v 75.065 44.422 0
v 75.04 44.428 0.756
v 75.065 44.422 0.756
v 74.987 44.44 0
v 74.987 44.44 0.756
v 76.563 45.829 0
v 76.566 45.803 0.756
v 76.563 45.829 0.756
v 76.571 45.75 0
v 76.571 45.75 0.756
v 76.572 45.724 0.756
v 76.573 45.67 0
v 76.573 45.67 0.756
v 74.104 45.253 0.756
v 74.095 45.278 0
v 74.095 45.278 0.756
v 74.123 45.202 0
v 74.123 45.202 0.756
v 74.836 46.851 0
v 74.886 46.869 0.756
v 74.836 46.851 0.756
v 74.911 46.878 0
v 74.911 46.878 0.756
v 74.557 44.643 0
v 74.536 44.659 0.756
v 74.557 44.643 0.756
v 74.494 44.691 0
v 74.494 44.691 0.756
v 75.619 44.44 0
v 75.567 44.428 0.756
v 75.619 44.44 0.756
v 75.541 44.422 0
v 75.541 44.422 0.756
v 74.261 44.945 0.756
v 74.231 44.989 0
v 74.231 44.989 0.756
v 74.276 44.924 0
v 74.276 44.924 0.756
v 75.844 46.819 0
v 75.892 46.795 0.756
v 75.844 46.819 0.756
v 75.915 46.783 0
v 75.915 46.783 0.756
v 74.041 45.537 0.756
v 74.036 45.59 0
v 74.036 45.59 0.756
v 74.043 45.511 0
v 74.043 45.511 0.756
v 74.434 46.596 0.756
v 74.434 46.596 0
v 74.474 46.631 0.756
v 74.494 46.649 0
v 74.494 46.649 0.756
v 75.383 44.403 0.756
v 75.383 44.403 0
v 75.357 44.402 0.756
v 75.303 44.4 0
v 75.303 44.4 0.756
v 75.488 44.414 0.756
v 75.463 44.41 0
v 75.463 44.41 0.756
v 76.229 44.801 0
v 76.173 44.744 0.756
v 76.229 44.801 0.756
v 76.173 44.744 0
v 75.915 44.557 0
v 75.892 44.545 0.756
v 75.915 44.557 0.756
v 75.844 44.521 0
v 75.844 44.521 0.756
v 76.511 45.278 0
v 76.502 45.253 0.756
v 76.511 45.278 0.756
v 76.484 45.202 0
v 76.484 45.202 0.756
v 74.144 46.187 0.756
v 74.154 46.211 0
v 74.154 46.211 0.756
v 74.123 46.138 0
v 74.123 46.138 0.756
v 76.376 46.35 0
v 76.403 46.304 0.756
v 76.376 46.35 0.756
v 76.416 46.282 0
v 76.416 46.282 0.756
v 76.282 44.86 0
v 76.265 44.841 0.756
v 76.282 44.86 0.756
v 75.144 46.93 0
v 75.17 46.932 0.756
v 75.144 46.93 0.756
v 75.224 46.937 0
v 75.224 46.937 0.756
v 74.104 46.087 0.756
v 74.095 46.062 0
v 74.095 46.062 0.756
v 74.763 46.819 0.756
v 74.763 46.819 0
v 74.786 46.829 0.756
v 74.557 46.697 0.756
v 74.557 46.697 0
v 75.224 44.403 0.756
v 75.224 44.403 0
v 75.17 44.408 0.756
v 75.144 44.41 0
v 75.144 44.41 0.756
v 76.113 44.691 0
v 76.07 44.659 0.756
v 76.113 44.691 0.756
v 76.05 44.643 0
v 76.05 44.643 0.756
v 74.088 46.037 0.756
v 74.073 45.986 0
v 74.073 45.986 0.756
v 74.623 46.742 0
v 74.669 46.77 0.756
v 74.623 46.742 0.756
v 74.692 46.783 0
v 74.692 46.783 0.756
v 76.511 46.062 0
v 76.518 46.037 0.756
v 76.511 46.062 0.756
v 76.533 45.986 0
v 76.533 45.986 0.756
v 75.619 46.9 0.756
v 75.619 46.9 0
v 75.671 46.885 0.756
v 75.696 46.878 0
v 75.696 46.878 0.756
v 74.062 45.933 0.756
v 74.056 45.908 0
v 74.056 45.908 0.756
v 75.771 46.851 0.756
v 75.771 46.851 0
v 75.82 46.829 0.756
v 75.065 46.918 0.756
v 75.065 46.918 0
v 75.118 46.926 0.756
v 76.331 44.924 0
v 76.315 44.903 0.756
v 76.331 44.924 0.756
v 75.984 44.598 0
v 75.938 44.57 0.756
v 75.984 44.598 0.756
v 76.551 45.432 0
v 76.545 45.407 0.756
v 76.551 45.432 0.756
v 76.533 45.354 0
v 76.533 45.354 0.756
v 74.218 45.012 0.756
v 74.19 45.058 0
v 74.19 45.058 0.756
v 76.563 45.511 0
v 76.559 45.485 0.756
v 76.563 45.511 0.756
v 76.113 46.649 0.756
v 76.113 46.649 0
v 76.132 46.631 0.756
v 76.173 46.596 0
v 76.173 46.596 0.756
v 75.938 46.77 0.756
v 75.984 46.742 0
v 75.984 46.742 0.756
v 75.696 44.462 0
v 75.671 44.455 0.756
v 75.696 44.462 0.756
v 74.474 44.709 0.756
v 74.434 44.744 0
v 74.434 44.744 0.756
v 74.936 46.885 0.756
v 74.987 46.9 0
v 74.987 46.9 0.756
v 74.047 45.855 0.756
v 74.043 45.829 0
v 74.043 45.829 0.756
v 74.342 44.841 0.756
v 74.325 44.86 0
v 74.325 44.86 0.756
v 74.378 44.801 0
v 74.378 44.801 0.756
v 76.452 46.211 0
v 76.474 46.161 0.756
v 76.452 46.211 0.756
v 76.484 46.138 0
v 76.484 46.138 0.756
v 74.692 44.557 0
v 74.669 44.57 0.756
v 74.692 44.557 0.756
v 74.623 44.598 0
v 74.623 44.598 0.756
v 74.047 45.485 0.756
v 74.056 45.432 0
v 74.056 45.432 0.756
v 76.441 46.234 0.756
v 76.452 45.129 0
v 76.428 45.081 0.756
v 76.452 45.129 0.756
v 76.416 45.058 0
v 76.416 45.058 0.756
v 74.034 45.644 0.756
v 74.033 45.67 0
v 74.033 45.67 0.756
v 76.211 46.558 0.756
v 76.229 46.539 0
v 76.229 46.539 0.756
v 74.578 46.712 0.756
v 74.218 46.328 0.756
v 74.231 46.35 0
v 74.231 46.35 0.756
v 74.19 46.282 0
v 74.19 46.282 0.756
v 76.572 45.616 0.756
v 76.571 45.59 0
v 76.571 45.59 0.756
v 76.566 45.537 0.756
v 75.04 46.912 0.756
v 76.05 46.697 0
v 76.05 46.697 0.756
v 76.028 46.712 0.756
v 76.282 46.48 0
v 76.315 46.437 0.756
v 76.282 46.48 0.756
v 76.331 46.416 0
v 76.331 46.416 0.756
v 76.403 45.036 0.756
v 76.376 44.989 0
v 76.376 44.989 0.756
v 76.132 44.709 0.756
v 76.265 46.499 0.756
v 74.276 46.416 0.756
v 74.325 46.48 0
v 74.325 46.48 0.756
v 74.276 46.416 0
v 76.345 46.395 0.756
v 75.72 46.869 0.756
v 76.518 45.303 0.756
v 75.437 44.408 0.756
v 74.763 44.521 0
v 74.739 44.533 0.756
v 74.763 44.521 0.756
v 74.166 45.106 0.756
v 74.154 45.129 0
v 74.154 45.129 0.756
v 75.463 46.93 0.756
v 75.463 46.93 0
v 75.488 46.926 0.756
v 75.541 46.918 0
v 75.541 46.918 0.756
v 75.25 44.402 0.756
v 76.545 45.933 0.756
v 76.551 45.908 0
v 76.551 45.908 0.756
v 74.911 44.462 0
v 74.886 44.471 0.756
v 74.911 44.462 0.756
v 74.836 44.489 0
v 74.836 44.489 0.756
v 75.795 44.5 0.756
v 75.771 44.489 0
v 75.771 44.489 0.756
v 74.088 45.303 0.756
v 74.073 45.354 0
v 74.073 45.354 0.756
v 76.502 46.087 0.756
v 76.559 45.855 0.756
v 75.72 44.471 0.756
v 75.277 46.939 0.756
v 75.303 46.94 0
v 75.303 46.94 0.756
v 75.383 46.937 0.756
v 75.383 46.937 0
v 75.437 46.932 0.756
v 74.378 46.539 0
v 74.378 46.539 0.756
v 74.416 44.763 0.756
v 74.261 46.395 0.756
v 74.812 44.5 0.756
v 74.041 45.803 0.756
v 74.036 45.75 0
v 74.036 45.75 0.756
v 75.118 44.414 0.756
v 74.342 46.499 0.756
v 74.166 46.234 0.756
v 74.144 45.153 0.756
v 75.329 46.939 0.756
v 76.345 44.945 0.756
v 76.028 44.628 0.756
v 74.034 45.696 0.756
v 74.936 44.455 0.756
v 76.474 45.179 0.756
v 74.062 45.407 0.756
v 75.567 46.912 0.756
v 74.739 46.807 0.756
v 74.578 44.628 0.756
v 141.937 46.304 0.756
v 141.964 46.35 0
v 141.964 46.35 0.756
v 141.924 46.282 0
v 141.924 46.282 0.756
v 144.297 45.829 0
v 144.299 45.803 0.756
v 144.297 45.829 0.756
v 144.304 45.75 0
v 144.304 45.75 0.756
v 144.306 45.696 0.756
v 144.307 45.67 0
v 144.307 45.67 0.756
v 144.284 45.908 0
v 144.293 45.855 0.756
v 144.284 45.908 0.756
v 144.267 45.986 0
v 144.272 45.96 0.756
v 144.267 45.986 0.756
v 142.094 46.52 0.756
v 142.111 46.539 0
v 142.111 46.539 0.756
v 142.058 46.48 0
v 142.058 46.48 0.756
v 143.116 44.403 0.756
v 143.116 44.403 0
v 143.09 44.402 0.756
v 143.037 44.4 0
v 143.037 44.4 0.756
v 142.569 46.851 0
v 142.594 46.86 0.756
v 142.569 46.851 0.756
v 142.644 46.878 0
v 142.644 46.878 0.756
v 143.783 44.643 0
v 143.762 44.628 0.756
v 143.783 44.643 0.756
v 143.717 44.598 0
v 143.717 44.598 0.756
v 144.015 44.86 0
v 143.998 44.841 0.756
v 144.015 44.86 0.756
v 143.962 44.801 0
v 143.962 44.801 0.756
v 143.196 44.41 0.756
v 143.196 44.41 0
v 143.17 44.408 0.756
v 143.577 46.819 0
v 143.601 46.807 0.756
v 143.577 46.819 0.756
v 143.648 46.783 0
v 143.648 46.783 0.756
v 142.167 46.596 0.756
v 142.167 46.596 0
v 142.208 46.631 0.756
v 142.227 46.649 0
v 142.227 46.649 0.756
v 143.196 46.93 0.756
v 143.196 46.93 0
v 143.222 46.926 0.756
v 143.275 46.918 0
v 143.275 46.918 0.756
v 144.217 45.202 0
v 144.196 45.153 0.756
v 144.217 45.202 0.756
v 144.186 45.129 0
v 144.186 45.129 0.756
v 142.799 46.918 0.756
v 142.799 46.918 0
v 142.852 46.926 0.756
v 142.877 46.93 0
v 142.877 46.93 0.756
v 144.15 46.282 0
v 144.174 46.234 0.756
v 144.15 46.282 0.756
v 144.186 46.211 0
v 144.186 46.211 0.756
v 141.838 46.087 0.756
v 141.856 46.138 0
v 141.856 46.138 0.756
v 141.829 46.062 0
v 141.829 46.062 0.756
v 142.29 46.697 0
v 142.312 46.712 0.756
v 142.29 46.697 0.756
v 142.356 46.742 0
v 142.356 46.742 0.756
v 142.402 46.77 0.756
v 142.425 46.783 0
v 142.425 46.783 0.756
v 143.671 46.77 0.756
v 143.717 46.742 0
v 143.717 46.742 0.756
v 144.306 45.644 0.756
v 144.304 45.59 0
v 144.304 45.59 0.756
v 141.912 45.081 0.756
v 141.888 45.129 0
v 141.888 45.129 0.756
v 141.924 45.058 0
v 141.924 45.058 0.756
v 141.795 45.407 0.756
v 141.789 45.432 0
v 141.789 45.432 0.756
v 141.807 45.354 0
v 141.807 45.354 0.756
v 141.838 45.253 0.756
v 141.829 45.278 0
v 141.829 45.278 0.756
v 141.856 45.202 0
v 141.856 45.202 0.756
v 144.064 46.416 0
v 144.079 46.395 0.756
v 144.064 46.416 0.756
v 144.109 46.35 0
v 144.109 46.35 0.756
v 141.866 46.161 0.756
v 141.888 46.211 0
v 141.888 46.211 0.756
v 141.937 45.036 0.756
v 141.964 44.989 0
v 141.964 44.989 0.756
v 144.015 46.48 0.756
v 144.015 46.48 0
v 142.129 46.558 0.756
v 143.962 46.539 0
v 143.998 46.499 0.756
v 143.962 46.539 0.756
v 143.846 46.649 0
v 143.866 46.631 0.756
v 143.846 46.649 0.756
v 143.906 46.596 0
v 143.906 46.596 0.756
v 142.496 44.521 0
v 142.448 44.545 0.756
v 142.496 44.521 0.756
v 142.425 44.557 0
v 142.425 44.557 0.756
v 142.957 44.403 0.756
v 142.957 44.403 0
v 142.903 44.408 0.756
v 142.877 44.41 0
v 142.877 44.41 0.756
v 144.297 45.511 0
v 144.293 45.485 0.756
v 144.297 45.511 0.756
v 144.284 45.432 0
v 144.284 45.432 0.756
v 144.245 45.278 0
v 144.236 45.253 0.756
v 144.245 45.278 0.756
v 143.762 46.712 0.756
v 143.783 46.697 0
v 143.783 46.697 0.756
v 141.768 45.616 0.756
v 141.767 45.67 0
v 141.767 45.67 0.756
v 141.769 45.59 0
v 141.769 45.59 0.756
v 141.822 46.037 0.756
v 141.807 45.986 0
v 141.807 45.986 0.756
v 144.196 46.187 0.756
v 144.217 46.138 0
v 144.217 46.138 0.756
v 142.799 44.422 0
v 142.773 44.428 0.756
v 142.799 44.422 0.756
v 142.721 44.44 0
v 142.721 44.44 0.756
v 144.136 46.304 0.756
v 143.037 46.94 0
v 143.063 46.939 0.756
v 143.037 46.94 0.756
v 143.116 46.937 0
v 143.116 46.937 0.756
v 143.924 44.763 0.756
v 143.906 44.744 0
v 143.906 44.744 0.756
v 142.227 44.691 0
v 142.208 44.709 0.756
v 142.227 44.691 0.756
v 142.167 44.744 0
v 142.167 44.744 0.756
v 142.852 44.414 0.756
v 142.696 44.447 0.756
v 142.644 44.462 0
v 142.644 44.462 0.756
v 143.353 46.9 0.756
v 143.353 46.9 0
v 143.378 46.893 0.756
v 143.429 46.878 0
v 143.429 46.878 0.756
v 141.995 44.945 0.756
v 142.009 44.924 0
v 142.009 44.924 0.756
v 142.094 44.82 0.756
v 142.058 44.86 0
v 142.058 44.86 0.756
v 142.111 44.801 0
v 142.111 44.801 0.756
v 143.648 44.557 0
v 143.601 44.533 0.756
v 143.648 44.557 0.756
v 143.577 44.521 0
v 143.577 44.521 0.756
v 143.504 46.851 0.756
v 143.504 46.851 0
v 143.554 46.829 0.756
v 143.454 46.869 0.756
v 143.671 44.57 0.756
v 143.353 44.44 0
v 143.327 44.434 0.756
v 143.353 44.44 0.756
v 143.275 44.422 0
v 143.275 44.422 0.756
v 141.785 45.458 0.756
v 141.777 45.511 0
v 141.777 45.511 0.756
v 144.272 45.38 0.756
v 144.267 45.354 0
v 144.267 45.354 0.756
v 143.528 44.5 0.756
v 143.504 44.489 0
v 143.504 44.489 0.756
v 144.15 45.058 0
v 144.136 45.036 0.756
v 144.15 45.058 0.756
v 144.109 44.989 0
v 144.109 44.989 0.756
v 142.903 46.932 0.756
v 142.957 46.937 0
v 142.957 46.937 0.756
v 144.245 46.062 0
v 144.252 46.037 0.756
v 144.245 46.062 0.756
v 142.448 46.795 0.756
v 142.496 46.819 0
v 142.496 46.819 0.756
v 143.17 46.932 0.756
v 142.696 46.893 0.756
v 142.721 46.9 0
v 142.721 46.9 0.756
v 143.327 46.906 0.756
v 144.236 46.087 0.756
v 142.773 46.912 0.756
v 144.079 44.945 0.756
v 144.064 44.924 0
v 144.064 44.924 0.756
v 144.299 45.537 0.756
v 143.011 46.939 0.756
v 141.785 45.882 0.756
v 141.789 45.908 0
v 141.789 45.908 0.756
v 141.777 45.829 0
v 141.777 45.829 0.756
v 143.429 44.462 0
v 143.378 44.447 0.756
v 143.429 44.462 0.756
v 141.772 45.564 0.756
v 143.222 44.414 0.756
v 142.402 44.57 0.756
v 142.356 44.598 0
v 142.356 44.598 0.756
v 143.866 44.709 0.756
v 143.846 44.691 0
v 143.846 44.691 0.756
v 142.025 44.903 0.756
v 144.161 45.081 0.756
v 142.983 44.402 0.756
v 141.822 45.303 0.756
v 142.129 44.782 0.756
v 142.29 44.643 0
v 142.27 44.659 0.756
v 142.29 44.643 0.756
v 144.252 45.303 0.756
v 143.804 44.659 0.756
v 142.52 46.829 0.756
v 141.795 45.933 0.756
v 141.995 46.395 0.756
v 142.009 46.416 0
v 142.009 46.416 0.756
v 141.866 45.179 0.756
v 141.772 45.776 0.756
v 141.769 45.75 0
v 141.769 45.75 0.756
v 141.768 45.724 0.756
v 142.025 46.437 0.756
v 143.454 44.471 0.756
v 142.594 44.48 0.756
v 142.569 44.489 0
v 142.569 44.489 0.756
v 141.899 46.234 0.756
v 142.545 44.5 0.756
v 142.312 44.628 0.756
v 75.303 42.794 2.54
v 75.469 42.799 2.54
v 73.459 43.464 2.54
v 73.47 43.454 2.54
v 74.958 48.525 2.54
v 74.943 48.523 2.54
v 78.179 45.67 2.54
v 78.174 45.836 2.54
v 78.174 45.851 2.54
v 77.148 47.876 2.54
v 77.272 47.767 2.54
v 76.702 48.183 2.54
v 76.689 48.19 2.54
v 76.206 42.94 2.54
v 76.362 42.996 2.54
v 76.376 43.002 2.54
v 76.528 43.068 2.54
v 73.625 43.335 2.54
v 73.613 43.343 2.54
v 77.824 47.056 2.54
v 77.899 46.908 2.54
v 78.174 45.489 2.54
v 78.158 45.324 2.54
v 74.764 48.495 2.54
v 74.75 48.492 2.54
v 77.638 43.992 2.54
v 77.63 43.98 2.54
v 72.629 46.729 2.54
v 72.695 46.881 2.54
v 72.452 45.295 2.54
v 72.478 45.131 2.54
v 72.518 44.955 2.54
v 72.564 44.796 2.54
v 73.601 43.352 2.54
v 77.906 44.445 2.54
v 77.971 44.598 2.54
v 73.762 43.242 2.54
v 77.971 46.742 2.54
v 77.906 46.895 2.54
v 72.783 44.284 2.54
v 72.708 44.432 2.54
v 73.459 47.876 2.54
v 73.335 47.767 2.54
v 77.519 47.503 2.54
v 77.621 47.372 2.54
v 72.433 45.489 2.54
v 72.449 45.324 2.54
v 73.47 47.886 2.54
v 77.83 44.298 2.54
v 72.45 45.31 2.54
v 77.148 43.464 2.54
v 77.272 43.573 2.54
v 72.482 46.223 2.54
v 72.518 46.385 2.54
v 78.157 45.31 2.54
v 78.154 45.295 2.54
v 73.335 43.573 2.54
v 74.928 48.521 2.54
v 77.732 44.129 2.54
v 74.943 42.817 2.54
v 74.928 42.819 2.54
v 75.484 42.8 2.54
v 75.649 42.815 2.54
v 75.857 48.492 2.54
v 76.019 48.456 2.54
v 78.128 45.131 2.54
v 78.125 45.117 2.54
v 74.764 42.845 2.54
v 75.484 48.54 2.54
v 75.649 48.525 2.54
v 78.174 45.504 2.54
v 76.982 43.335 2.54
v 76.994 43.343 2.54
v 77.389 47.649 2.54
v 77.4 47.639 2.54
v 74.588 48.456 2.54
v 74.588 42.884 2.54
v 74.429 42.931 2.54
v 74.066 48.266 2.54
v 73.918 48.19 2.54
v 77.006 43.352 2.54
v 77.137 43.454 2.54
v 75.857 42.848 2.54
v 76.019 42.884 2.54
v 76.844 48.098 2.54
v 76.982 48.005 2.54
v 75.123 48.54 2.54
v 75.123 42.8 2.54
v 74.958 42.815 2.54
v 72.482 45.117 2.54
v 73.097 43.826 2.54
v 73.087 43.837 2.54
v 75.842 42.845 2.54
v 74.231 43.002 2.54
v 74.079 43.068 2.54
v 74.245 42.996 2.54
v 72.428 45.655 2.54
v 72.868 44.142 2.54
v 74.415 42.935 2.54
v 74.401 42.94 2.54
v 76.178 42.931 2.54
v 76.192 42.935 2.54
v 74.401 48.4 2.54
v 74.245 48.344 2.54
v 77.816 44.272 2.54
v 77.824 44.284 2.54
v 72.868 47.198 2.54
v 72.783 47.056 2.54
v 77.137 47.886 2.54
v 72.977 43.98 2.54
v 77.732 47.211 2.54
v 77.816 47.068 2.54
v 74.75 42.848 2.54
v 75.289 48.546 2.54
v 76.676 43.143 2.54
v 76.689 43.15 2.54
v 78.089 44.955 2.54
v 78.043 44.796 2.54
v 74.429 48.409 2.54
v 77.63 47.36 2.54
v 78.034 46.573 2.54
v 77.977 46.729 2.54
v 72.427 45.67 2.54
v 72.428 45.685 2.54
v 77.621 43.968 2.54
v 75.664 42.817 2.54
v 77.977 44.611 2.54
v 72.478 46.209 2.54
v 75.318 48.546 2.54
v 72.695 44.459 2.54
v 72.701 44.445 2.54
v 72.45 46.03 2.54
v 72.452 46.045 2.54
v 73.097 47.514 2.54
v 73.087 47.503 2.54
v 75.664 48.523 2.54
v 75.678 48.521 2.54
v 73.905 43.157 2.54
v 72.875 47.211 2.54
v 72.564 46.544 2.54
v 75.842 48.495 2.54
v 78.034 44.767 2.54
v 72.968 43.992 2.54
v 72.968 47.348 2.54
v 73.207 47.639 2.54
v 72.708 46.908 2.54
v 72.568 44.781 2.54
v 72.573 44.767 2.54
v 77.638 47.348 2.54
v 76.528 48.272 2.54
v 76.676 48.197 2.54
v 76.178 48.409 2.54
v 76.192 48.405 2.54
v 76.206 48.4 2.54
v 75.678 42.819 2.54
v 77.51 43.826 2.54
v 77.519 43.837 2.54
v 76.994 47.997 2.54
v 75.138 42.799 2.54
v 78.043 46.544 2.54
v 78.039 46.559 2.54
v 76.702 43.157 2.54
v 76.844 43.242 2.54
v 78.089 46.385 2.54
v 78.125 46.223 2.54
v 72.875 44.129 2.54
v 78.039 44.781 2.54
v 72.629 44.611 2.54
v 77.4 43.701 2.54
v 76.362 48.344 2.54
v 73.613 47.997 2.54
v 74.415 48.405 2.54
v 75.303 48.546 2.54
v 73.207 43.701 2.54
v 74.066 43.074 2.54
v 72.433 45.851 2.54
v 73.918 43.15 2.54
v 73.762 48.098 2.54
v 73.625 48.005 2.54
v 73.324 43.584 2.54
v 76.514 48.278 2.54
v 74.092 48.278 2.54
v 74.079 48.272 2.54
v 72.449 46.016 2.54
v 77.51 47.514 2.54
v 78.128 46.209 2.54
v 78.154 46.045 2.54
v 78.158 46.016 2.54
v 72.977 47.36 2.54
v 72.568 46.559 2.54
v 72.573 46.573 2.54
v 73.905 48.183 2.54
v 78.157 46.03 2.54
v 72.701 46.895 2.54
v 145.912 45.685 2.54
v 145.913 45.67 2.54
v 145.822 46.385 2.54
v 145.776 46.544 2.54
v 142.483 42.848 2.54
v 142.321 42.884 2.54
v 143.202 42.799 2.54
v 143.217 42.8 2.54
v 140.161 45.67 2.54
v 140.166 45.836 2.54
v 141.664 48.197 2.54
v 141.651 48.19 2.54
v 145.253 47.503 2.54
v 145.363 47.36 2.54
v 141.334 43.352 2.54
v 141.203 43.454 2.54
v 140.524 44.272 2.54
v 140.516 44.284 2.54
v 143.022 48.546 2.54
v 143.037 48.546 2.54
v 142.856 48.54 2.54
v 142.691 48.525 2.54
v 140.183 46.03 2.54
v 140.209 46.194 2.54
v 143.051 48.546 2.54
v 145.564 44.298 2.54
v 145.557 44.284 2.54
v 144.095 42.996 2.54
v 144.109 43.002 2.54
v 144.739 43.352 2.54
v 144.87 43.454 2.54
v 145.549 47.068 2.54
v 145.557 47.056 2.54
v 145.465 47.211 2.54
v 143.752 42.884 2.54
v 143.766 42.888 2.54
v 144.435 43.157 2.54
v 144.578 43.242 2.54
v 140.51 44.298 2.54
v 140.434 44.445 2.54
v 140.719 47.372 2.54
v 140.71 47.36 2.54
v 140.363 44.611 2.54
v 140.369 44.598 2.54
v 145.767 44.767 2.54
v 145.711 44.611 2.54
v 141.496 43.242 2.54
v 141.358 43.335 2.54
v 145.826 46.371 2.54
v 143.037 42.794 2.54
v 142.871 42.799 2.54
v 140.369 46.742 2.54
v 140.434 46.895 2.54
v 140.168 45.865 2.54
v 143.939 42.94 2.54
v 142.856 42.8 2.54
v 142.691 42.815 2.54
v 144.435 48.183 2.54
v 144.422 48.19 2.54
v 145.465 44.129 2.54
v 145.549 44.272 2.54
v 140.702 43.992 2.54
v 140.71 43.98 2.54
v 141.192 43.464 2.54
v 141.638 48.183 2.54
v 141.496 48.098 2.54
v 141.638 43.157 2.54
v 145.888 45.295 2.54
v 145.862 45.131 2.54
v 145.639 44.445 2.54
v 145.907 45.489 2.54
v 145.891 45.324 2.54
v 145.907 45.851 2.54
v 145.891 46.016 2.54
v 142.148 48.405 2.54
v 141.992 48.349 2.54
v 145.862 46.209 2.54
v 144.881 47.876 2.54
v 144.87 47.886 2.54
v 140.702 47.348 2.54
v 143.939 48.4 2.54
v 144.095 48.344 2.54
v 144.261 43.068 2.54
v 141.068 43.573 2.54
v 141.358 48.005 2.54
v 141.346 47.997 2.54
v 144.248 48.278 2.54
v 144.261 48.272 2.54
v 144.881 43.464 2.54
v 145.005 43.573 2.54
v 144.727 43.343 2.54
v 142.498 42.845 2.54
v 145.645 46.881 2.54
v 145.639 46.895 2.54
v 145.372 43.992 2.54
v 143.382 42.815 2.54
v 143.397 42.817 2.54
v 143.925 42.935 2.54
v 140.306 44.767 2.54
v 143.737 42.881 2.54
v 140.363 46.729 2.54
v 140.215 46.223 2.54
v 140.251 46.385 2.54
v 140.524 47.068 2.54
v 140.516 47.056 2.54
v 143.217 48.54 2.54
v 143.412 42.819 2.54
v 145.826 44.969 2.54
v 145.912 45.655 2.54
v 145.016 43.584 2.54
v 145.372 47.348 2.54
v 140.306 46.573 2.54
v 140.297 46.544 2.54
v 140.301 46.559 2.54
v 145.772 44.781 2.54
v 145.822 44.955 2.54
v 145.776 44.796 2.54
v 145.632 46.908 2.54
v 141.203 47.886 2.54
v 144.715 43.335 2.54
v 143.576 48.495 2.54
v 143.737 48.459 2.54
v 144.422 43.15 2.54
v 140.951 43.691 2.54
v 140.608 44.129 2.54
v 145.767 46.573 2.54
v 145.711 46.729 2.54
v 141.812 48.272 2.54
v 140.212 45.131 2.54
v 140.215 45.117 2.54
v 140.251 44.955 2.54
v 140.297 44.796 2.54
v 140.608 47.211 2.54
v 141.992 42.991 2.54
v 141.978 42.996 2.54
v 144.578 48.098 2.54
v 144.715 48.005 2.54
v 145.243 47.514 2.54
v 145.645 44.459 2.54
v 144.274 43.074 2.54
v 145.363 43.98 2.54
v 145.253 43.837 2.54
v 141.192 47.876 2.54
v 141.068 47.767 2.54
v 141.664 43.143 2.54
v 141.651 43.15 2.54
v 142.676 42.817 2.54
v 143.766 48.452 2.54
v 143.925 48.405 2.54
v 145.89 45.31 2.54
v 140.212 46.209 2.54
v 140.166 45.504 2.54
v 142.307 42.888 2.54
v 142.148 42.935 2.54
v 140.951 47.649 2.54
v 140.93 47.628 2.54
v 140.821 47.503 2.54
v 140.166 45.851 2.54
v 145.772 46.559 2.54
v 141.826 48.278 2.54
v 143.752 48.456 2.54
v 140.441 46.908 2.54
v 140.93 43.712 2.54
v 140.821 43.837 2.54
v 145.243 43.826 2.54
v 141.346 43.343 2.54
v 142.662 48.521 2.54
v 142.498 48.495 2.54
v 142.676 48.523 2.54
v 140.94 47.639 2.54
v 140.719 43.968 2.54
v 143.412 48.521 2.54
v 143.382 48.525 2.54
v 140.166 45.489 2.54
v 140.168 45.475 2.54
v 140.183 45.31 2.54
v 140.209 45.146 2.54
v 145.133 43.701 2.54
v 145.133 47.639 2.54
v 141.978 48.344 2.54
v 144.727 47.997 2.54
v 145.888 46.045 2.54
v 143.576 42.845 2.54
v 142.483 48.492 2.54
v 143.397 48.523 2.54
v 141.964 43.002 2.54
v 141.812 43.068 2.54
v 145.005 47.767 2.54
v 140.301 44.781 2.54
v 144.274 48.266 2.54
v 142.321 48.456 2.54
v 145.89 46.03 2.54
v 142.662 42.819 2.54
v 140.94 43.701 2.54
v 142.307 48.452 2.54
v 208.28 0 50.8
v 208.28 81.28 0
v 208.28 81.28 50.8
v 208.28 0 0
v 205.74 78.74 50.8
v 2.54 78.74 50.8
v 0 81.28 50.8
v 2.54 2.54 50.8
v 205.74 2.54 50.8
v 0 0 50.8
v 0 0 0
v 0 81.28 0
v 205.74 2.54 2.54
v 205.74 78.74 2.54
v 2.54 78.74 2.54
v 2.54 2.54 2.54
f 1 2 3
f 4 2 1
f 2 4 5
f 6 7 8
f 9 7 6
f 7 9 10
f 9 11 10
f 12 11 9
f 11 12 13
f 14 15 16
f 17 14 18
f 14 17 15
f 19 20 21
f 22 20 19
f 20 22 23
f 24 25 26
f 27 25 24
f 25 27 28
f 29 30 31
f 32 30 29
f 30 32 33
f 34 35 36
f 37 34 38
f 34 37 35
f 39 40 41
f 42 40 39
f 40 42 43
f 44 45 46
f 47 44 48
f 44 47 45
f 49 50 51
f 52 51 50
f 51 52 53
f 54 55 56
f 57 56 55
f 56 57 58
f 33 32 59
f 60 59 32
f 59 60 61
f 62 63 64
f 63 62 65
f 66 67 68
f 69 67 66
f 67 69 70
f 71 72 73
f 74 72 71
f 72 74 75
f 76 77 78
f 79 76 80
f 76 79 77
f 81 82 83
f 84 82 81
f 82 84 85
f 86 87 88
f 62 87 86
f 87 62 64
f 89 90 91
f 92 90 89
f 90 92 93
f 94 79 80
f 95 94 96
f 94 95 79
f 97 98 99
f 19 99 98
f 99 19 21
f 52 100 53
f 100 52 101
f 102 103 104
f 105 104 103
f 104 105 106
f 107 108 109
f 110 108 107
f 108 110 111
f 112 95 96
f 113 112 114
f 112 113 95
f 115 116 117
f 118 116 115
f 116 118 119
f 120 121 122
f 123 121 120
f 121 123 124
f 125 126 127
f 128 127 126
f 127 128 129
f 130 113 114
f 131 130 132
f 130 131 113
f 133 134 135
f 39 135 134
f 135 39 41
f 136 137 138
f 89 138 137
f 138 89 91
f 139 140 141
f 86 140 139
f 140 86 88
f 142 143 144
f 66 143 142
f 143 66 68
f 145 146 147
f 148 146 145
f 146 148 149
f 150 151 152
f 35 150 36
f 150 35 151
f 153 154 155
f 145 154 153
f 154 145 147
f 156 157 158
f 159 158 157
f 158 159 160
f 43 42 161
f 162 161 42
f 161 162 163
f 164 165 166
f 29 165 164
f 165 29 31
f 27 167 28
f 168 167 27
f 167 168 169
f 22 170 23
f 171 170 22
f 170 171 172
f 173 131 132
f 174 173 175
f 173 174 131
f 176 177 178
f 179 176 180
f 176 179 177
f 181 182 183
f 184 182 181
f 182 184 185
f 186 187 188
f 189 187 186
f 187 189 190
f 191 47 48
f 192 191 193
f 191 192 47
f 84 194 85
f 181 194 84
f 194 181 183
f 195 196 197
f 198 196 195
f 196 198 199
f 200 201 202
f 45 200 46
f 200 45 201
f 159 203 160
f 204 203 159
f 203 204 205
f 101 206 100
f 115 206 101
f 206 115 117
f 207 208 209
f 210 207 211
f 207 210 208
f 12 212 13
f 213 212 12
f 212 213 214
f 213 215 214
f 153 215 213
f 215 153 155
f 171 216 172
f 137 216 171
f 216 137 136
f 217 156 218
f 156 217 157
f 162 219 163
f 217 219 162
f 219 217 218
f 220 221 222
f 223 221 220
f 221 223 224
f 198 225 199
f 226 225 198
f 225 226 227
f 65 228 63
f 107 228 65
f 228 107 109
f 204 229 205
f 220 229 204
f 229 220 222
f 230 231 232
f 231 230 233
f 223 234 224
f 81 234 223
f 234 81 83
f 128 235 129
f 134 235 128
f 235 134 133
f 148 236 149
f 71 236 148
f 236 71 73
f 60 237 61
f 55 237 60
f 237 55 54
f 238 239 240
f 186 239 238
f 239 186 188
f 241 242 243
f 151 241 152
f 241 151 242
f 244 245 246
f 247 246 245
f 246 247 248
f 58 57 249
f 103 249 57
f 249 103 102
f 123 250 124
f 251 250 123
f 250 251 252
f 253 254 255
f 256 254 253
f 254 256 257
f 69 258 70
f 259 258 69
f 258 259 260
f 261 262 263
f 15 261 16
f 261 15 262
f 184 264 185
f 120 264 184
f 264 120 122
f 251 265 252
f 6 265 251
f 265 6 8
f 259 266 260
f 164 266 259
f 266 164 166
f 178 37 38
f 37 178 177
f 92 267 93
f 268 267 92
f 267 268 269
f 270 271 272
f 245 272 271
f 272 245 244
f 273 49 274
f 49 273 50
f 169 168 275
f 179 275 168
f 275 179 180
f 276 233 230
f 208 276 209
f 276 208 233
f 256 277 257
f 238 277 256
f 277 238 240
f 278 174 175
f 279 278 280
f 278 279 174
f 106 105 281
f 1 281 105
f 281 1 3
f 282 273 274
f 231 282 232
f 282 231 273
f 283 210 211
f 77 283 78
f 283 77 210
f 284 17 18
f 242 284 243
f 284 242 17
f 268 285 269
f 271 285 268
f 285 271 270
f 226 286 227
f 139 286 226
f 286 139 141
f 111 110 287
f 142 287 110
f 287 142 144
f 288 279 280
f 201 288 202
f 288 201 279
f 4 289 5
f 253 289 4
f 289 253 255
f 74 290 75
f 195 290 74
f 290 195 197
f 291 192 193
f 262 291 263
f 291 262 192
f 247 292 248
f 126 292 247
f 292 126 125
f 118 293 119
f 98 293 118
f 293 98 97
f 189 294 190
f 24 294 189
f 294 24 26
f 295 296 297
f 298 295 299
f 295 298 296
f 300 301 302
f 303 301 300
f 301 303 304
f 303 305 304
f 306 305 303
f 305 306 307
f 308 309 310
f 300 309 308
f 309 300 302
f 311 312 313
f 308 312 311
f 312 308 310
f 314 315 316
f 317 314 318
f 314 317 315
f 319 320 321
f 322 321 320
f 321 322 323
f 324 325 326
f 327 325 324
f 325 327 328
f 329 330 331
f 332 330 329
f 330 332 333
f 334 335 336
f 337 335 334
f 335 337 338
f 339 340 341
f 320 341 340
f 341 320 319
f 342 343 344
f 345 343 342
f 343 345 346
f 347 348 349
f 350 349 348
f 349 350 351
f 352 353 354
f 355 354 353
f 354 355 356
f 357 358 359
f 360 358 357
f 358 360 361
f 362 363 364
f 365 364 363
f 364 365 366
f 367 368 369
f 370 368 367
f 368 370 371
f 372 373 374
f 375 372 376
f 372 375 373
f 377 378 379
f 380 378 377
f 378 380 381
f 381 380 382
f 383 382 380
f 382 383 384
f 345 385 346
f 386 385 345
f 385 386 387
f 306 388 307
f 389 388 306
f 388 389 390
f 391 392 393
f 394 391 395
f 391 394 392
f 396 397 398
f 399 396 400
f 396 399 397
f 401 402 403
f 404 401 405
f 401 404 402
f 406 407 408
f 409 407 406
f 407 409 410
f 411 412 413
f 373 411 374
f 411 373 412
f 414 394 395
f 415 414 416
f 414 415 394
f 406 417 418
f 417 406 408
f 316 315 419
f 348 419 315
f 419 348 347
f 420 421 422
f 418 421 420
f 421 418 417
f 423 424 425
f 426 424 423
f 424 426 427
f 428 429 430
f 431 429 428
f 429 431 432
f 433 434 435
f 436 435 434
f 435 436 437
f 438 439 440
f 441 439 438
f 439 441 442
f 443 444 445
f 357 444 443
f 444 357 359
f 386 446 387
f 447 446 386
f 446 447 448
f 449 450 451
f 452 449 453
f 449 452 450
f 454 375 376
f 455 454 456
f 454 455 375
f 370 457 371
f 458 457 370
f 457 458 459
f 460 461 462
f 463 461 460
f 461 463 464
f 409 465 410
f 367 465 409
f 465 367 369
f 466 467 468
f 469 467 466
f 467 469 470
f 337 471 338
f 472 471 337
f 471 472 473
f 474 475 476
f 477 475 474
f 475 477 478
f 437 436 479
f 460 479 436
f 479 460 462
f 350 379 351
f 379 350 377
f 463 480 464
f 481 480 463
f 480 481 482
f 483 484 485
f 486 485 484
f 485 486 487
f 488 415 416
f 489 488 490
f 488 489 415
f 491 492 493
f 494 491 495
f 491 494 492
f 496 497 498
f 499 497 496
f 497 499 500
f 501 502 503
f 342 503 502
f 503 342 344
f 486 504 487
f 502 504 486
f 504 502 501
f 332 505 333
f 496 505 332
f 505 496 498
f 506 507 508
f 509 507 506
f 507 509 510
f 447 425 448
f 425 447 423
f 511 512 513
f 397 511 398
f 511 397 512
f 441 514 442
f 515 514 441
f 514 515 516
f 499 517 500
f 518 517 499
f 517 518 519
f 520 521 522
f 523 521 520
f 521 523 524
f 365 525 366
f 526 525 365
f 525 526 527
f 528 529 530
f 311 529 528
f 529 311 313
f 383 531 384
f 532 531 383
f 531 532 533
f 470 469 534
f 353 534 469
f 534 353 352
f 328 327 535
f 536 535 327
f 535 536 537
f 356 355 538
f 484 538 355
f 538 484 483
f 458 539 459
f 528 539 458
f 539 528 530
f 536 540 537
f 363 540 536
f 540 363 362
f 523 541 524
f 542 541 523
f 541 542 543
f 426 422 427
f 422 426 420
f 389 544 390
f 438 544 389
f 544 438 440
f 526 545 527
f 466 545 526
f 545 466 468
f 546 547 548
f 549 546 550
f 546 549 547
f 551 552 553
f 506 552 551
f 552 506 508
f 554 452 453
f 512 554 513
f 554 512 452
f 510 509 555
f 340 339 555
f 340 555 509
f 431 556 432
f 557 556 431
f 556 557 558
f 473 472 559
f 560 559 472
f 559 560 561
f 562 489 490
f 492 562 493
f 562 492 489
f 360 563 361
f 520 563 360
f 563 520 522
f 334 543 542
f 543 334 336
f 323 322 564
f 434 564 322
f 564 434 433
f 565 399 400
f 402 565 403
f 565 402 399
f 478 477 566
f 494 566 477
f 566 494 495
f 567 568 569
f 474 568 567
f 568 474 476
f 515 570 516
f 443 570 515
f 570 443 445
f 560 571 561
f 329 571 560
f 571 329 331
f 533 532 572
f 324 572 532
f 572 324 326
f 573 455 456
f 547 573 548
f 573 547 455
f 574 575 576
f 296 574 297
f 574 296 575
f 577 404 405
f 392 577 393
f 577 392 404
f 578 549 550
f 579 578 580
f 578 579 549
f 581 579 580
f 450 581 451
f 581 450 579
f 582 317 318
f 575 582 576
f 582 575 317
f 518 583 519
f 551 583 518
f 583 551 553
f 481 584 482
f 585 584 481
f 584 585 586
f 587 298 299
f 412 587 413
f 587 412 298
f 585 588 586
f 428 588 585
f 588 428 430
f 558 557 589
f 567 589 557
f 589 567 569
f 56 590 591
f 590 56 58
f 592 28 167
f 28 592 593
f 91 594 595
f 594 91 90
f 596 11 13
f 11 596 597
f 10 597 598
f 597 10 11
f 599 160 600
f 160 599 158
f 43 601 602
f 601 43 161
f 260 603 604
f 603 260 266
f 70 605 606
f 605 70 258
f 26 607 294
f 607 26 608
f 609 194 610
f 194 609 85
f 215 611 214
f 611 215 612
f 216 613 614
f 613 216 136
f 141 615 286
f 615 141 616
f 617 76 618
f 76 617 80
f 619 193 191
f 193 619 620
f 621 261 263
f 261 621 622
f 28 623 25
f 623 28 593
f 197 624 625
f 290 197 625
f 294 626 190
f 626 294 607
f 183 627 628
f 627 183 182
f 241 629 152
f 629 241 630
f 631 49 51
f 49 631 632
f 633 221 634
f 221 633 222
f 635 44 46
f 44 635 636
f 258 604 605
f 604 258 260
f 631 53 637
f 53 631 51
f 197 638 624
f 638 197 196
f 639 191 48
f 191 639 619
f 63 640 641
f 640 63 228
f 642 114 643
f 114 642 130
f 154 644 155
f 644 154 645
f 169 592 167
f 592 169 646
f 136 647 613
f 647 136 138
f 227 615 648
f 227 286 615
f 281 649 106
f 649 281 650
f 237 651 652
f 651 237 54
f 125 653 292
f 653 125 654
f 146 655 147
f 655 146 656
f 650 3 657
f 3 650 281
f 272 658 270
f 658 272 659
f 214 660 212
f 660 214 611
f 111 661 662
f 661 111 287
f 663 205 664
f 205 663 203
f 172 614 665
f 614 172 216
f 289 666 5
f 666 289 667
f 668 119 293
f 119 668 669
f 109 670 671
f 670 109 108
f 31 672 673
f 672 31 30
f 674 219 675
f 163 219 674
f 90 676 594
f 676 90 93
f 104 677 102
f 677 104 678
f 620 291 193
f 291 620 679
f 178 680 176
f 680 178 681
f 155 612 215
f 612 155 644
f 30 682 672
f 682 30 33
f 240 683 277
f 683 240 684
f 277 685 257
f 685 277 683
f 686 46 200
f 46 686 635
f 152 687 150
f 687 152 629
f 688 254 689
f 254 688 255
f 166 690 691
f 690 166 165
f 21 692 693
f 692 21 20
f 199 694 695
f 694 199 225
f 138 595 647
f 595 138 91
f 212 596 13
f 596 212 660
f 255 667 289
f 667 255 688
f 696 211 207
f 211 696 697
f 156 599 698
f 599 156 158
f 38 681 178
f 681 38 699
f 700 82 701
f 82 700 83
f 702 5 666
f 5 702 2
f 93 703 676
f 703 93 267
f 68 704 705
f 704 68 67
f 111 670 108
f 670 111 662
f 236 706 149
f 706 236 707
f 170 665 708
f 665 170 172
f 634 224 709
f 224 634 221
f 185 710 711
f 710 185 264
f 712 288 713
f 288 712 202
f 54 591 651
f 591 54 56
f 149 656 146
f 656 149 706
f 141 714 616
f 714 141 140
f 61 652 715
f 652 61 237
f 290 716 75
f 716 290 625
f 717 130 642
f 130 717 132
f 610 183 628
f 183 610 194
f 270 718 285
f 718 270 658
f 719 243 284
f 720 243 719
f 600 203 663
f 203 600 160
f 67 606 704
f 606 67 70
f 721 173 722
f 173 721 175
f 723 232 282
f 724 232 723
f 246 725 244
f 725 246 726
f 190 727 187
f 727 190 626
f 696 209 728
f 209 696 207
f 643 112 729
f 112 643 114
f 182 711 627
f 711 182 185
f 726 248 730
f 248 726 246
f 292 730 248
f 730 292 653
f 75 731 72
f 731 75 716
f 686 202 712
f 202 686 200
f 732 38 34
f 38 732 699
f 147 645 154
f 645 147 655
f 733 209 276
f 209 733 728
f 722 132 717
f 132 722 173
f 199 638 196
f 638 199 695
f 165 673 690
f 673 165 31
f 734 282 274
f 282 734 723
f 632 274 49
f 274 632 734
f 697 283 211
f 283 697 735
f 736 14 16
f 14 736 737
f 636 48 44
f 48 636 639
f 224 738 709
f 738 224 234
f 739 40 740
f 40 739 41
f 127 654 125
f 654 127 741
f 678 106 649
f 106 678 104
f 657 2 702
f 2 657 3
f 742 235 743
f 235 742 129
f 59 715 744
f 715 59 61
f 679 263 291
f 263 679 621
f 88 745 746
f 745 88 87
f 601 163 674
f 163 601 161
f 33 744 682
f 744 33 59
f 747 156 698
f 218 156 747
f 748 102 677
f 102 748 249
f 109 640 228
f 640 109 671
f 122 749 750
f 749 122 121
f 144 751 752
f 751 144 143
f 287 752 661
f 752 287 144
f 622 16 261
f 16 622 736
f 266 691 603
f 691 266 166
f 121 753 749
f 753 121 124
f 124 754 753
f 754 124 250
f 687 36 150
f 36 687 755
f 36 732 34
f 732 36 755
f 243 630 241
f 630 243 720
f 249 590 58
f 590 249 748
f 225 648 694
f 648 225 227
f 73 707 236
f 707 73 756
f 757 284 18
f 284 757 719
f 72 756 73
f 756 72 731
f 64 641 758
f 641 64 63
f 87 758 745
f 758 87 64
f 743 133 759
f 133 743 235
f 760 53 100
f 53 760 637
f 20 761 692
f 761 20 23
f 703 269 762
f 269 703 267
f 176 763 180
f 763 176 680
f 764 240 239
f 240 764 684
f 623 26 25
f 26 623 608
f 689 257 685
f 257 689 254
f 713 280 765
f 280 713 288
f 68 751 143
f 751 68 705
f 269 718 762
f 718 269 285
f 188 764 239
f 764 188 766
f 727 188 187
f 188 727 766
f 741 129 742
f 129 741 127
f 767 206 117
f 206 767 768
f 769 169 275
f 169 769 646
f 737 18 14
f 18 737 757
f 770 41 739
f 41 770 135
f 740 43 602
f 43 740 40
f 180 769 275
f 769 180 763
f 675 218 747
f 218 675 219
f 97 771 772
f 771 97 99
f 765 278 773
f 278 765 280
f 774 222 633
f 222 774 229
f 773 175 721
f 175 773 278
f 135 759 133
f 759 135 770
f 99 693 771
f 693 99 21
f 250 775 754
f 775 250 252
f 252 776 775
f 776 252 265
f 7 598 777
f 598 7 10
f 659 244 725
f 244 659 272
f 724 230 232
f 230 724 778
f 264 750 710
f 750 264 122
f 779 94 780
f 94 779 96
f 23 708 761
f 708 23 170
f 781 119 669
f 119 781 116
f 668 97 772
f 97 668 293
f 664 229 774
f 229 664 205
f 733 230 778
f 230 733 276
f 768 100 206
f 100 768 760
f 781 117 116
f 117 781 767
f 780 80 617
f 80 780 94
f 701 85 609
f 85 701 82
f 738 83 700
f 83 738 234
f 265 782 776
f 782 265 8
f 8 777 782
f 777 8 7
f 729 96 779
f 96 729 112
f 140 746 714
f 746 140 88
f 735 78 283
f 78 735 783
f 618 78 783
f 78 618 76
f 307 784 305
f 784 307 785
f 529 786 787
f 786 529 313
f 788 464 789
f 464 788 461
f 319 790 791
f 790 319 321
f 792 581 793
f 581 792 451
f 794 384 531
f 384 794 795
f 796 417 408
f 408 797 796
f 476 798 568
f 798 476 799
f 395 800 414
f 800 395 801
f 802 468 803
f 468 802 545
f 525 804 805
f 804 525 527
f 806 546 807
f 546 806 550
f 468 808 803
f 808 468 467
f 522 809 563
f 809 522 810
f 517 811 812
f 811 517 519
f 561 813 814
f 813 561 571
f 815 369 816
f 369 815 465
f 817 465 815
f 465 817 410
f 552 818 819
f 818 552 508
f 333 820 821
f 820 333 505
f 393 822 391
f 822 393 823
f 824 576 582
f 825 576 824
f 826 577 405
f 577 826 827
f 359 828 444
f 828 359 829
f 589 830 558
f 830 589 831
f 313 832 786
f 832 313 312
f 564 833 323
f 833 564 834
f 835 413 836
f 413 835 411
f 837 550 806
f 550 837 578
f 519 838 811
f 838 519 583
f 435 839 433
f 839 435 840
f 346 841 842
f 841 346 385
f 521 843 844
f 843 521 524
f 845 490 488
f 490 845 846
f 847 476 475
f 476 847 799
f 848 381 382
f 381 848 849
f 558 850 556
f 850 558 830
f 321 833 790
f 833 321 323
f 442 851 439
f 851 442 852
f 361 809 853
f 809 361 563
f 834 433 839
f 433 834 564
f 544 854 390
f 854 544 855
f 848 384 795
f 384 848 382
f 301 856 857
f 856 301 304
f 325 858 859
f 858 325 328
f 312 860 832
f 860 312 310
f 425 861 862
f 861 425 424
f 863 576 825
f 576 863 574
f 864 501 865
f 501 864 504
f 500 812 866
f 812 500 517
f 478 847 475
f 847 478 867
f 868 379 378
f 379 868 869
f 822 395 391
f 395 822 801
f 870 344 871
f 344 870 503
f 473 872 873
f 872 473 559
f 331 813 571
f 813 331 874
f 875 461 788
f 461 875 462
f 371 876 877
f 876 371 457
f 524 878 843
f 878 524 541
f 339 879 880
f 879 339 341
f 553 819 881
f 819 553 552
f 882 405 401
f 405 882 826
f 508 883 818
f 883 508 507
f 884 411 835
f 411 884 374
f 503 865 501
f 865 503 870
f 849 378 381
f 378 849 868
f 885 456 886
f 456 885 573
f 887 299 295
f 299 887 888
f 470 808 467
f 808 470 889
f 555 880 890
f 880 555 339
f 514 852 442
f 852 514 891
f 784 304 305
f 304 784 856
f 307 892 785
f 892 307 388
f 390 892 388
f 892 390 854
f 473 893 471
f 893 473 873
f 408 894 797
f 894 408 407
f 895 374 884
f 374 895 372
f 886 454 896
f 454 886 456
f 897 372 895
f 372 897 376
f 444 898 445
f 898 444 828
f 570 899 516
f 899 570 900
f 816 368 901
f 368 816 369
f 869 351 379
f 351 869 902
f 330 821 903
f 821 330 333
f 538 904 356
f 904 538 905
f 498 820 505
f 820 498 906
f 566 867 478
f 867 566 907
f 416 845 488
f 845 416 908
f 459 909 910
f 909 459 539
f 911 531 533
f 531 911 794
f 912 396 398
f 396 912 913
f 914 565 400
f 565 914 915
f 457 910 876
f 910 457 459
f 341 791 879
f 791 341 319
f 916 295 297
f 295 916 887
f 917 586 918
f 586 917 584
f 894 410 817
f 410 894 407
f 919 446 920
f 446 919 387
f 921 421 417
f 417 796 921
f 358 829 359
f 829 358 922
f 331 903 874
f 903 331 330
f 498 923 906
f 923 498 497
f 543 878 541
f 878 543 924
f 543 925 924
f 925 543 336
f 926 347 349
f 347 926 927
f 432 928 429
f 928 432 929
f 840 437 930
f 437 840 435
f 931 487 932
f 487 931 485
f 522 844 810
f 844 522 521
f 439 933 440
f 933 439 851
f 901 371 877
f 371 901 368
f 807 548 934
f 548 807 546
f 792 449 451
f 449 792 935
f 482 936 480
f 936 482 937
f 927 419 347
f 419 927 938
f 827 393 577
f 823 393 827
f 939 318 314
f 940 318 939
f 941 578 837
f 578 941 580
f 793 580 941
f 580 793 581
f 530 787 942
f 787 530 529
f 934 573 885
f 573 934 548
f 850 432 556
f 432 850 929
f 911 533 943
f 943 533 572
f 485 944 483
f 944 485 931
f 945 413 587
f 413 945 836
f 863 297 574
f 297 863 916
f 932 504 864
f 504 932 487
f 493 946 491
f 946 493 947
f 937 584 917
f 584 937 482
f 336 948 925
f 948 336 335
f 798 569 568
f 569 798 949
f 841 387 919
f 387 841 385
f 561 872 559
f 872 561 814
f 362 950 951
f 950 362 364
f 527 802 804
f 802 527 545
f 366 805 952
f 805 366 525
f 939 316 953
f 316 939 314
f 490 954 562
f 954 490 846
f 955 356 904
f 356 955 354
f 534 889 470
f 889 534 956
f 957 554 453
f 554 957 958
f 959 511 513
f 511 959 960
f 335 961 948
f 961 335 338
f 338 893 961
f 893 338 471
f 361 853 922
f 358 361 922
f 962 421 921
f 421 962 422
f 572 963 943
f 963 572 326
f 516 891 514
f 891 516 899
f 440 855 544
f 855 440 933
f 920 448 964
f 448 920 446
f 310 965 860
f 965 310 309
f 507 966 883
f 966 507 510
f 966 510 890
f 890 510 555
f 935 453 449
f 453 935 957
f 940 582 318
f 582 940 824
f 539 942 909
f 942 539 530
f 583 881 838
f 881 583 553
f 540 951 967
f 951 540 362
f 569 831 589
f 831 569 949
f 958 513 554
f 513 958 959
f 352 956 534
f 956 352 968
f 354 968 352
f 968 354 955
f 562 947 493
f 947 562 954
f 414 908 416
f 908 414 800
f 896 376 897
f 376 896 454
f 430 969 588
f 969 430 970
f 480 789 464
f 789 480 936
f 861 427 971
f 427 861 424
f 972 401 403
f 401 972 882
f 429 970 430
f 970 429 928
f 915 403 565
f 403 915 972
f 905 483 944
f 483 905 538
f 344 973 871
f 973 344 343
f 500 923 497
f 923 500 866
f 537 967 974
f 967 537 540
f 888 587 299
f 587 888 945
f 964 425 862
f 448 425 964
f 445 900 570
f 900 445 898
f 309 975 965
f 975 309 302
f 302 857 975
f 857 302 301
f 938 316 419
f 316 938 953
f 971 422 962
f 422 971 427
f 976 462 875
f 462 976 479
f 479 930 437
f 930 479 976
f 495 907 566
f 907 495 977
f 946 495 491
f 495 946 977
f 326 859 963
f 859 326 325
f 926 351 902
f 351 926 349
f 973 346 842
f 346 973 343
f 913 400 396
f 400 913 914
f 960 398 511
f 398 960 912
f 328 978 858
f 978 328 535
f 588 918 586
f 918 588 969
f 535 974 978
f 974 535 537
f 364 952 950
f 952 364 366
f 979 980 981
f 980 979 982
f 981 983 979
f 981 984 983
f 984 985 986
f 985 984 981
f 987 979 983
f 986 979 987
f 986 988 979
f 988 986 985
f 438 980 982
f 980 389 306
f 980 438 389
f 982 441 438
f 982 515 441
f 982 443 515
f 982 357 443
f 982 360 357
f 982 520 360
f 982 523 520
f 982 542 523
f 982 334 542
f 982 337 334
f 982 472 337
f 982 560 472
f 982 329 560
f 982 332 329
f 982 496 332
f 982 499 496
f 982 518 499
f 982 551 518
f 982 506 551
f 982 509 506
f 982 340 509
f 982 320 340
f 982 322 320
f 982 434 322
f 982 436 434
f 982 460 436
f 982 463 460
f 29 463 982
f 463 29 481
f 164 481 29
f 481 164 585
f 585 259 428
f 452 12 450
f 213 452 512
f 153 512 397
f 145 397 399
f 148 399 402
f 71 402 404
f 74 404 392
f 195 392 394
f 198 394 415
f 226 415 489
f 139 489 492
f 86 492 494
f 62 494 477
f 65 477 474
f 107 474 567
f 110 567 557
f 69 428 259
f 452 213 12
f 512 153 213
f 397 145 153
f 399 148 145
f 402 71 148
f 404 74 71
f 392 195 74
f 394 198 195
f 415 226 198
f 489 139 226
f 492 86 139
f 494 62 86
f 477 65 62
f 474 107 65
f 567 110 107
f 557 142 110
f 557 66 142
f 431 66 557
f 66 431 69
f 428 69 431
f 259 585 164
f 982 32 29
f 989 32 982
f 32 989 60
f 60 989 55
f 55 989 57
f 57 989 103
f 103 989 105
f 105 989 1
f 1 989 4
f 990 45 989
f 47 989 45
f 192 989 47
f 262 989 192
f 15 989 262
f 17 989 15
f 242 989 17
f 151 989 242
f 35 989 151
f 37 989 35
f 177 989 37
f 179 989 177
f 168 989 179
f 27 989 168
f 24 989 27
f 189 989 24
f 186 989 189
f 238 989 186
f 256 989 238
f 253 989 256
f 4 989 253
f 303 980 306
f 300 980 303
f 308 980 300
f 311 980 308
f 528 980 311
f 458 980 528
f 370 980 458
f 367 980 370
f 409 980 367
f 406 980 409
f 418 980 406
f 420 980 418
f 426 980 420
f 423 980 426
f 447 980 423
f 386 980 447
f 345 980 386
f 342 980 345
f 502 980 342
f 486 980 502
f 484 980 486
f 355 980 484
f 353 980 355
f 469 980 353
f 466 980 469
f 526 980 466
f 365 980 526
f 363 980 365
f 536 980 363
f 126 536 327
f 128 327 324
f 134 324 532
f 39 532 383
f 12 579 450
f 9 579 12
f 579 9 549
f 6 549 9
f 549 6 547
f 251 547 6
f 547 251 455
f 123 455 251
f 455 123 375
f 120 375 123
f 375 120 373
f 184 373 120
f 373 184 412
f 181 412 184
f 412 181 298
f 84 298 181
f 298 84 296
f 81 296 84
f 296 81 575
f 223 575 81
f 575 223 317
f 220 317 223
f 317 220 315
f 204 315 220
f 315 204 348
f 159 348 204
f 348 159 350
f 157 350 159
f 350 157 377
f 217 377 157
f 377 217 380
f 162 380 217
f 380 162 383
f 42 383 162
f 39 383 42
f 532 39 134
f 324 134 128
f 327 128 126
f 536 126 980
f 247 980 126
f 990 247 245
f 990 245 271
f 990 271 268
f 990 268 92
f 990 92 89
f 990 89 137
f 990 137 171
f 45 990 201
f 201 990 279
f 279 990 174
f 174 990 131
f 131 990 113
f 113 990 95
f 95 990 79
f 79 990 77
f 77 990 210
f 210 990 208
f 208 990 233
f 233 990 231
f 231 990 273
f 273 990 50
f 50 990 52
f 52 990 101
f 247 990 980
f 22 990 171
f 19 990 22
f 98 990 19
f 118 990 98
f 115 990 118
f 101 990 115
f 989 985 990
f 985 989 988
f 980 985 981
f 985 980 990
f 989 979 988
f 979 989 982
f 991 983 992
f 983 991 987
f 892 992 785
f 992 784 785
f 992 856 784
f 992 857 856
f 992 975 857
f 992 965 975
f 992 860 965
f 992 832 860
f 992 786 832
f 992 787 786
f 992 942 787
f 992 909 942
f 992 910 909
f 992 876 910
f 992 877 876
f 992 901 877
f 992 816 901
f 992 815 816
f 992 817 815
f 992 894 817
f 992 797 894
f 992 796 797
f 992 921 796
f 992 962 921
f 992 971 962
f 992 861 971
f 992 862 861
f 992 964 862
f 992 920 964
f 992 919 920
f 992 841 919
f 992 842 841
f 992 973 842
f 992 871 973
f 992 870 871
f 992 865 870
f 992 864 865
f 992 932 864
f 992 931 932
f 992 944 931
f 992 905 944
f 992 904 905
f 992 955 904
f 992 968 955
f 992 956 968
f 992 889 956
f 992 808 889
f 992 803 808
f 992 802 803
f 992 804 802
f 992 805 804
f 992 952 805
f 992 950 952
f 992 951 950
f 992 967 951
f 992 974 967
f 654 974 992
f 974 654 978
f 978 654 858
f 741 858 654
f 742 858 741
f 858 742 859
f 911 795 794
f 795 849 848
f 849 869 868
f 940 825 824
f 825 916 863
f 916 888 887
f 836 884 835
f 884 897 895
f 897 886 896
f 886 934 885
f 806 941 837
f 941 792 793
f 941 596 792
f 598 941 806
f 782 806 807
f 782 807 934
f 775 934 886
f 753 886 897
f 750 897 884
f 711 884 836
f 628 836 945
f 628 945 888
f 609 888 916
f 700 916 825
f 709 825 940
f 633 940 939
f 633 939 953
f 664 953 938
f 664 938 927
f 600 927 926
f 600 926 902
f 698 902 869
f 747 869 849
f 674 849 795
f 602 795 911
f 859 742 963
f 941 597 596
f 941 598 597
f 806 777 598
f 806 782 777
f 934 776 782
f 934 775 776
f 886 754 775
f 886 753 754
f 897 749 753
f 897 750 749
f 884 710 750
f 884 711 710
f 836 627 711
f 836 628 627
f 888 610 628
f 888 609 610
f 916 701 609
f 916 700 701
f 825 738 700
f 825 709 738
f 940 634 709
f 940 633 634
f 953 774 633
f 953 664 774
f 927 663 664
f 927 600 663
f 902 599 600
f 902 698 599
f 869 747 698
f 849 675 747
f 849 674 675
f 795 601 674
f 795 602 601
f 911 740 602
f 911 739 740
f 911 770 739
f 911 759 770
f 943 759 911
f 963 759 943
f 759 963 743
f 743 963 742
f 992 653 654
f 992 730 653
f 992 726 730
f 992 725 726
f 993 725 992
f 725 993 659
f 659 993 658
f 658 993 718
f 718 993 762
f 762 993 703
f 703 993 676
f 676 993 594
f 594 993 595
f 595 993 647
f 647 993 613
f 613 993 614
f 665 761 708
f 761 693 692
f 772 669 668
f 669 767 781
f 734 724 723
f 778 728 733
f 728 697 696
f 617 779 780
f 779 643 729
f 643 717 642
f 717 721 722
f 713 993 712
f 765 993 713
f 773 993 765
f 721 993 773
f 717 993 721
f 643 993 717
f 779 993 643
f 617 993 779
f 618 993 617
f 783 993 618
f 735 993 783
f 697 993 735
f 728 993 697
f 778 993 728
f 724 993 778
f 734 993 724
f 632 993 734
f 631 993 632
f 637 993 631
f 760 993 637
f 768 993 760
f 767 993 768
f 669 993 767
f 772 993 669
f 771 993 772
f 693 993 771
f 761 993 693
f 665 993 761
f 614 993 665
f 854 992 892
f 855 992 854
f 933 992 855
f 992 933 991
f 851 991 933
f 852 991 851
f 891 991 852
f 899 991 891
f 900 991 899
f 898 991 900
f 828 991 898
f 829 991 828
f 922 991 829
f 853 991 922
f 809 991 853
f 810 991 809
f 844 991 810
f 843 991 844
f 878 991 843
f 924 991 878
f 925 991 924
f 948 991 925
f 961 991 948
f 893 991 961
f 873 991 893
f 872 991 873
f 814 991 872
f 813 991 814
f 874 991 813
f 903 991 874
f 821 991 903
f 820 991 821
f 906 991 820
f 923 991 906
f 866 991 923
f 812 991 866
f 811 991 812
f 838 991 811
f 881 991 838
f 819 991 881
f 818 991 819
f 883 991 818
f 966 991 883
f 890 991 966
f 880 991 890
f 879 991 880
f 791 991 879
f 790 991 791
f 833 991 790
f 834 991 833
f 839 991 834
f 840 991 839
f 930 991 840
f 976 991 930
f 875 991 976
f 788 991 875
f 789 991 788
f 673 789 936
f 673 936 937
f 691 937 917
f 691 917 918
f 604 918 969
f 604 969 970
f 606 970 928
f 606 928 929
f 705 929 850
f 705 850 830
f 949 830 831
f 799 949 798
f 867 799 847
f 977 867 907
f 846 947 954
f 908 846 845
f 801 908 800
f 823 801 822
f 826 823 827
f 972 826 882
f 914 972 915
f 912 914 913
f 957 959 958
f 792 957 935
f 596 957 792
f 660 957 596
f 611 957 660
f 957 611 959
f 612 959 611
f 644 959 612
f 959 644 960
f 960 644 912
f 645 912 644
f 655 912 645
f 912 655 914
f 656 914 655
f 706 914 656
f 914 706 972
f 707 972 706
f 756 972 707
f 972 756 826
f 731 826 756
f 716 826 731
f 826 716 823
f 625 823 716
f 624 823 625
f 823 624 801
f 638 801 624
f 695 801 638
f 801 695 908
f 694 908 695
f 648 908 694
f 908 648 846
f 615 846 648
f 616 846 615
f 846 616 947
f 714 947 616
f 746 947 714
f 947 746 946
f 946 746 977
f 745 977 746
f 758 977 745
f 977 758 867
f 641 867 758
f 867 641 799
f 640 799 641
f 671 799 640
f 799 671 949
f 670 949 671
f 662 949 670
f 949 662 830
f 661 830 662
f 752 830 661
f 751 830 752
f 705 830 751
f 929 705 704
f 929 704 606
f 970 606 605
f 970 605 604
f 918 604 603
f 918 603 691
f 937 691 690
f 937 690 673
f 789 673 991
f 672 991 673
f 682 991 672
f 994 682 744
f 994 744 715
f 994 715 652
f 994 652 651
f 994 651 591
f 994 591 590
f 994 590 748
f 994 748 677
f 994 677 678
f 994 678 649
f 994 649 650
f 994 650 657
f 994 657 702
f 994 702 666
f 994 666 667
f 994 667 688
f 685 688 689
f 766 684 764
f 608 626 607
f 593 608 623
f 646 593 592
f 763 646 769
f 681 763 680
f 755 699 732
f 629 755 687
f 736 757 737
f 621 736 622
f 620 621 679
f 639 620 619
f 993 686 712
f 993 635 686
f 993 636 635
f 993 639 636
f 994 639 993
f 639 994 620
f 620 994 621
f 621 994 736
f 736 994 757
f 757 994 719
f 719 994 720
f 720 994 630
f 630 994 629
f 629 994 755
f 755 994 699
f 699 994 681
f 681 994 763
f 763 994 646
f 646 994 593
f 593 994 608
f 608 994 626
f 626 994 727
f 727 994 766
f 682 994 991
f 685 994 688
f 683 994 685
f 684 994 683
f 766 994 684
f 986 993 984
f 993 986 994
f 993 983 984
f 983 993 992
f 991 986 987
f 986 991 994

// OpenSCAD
// All units are in Milimeter
$fn = 100;

//Makeup bag container
bagLt = 203.2; // 8"
bagWt = 76.2; // 3"
bagHt = 50.8; // 2"
bagThickness = 2.54; // .10"
floorThickness = 6.3; //.25"
screwHole = 5.08; // .20"
chamferAdjust = 6.4;
screwHoleAmount = 3; // amount -1 

difference(){
  cube([
    bagLt+bagThickness*2,
    bagWt+bagThickness*2,
    bagHt
    ],
    center=false
  );
  // Inside Dimensions
  translate([bagThickness,bagThickness,bagThickness])
  cube([
    bagLt,
    bagWt,
    bagHt+50
    ],
    center=false
  );
  // Screw Hole
  for(x=[1:screwHoleAmount-1])
    screwHoleBox(x,bagWt,bagLt,bagWt,bagThickness,floorThickness);
  // Chamfer
  for(x=[1:screwHoleAmount-1])
    chamferBox(x,bagWt,bagLt,bagWt,bagThickness,floorThickness);
  

};

// Screw Hole
module screwHoleBox(
  xPos=0,
  yPos=0,
  boxL,
  boxW,
  holeDia=5.08,
  wallThickness=2.54,
  bottomThickness=6.3){
  translate([
    (wallThickness)+(holeDia/2)+xPos*(boxL/screwHoleAmount),
    (wallThickness)+(holeDia/2)+yPos/2,
    -bottomThickness])
  cylinder(
   150,
   d=holeDia,
   center=false
  );
}

module chamferBox(
  xPos=0,
  yPos=0,
  boxL,boxW,
  holeDia=5.08,
  wallThickness=2.54,
  bottomThickness=6.3){
  translate([
    (wallThickness)+(holeDia/2)+xPos*(boxL/screwHoleAmount),
    (wallThickness)+(holeDia/2)+yPos/2,
    bottomThickness-chamferAdjust])
  cylinder(
   5,
   d1=1,
   d2=10,
   center=false
  );
}
  
